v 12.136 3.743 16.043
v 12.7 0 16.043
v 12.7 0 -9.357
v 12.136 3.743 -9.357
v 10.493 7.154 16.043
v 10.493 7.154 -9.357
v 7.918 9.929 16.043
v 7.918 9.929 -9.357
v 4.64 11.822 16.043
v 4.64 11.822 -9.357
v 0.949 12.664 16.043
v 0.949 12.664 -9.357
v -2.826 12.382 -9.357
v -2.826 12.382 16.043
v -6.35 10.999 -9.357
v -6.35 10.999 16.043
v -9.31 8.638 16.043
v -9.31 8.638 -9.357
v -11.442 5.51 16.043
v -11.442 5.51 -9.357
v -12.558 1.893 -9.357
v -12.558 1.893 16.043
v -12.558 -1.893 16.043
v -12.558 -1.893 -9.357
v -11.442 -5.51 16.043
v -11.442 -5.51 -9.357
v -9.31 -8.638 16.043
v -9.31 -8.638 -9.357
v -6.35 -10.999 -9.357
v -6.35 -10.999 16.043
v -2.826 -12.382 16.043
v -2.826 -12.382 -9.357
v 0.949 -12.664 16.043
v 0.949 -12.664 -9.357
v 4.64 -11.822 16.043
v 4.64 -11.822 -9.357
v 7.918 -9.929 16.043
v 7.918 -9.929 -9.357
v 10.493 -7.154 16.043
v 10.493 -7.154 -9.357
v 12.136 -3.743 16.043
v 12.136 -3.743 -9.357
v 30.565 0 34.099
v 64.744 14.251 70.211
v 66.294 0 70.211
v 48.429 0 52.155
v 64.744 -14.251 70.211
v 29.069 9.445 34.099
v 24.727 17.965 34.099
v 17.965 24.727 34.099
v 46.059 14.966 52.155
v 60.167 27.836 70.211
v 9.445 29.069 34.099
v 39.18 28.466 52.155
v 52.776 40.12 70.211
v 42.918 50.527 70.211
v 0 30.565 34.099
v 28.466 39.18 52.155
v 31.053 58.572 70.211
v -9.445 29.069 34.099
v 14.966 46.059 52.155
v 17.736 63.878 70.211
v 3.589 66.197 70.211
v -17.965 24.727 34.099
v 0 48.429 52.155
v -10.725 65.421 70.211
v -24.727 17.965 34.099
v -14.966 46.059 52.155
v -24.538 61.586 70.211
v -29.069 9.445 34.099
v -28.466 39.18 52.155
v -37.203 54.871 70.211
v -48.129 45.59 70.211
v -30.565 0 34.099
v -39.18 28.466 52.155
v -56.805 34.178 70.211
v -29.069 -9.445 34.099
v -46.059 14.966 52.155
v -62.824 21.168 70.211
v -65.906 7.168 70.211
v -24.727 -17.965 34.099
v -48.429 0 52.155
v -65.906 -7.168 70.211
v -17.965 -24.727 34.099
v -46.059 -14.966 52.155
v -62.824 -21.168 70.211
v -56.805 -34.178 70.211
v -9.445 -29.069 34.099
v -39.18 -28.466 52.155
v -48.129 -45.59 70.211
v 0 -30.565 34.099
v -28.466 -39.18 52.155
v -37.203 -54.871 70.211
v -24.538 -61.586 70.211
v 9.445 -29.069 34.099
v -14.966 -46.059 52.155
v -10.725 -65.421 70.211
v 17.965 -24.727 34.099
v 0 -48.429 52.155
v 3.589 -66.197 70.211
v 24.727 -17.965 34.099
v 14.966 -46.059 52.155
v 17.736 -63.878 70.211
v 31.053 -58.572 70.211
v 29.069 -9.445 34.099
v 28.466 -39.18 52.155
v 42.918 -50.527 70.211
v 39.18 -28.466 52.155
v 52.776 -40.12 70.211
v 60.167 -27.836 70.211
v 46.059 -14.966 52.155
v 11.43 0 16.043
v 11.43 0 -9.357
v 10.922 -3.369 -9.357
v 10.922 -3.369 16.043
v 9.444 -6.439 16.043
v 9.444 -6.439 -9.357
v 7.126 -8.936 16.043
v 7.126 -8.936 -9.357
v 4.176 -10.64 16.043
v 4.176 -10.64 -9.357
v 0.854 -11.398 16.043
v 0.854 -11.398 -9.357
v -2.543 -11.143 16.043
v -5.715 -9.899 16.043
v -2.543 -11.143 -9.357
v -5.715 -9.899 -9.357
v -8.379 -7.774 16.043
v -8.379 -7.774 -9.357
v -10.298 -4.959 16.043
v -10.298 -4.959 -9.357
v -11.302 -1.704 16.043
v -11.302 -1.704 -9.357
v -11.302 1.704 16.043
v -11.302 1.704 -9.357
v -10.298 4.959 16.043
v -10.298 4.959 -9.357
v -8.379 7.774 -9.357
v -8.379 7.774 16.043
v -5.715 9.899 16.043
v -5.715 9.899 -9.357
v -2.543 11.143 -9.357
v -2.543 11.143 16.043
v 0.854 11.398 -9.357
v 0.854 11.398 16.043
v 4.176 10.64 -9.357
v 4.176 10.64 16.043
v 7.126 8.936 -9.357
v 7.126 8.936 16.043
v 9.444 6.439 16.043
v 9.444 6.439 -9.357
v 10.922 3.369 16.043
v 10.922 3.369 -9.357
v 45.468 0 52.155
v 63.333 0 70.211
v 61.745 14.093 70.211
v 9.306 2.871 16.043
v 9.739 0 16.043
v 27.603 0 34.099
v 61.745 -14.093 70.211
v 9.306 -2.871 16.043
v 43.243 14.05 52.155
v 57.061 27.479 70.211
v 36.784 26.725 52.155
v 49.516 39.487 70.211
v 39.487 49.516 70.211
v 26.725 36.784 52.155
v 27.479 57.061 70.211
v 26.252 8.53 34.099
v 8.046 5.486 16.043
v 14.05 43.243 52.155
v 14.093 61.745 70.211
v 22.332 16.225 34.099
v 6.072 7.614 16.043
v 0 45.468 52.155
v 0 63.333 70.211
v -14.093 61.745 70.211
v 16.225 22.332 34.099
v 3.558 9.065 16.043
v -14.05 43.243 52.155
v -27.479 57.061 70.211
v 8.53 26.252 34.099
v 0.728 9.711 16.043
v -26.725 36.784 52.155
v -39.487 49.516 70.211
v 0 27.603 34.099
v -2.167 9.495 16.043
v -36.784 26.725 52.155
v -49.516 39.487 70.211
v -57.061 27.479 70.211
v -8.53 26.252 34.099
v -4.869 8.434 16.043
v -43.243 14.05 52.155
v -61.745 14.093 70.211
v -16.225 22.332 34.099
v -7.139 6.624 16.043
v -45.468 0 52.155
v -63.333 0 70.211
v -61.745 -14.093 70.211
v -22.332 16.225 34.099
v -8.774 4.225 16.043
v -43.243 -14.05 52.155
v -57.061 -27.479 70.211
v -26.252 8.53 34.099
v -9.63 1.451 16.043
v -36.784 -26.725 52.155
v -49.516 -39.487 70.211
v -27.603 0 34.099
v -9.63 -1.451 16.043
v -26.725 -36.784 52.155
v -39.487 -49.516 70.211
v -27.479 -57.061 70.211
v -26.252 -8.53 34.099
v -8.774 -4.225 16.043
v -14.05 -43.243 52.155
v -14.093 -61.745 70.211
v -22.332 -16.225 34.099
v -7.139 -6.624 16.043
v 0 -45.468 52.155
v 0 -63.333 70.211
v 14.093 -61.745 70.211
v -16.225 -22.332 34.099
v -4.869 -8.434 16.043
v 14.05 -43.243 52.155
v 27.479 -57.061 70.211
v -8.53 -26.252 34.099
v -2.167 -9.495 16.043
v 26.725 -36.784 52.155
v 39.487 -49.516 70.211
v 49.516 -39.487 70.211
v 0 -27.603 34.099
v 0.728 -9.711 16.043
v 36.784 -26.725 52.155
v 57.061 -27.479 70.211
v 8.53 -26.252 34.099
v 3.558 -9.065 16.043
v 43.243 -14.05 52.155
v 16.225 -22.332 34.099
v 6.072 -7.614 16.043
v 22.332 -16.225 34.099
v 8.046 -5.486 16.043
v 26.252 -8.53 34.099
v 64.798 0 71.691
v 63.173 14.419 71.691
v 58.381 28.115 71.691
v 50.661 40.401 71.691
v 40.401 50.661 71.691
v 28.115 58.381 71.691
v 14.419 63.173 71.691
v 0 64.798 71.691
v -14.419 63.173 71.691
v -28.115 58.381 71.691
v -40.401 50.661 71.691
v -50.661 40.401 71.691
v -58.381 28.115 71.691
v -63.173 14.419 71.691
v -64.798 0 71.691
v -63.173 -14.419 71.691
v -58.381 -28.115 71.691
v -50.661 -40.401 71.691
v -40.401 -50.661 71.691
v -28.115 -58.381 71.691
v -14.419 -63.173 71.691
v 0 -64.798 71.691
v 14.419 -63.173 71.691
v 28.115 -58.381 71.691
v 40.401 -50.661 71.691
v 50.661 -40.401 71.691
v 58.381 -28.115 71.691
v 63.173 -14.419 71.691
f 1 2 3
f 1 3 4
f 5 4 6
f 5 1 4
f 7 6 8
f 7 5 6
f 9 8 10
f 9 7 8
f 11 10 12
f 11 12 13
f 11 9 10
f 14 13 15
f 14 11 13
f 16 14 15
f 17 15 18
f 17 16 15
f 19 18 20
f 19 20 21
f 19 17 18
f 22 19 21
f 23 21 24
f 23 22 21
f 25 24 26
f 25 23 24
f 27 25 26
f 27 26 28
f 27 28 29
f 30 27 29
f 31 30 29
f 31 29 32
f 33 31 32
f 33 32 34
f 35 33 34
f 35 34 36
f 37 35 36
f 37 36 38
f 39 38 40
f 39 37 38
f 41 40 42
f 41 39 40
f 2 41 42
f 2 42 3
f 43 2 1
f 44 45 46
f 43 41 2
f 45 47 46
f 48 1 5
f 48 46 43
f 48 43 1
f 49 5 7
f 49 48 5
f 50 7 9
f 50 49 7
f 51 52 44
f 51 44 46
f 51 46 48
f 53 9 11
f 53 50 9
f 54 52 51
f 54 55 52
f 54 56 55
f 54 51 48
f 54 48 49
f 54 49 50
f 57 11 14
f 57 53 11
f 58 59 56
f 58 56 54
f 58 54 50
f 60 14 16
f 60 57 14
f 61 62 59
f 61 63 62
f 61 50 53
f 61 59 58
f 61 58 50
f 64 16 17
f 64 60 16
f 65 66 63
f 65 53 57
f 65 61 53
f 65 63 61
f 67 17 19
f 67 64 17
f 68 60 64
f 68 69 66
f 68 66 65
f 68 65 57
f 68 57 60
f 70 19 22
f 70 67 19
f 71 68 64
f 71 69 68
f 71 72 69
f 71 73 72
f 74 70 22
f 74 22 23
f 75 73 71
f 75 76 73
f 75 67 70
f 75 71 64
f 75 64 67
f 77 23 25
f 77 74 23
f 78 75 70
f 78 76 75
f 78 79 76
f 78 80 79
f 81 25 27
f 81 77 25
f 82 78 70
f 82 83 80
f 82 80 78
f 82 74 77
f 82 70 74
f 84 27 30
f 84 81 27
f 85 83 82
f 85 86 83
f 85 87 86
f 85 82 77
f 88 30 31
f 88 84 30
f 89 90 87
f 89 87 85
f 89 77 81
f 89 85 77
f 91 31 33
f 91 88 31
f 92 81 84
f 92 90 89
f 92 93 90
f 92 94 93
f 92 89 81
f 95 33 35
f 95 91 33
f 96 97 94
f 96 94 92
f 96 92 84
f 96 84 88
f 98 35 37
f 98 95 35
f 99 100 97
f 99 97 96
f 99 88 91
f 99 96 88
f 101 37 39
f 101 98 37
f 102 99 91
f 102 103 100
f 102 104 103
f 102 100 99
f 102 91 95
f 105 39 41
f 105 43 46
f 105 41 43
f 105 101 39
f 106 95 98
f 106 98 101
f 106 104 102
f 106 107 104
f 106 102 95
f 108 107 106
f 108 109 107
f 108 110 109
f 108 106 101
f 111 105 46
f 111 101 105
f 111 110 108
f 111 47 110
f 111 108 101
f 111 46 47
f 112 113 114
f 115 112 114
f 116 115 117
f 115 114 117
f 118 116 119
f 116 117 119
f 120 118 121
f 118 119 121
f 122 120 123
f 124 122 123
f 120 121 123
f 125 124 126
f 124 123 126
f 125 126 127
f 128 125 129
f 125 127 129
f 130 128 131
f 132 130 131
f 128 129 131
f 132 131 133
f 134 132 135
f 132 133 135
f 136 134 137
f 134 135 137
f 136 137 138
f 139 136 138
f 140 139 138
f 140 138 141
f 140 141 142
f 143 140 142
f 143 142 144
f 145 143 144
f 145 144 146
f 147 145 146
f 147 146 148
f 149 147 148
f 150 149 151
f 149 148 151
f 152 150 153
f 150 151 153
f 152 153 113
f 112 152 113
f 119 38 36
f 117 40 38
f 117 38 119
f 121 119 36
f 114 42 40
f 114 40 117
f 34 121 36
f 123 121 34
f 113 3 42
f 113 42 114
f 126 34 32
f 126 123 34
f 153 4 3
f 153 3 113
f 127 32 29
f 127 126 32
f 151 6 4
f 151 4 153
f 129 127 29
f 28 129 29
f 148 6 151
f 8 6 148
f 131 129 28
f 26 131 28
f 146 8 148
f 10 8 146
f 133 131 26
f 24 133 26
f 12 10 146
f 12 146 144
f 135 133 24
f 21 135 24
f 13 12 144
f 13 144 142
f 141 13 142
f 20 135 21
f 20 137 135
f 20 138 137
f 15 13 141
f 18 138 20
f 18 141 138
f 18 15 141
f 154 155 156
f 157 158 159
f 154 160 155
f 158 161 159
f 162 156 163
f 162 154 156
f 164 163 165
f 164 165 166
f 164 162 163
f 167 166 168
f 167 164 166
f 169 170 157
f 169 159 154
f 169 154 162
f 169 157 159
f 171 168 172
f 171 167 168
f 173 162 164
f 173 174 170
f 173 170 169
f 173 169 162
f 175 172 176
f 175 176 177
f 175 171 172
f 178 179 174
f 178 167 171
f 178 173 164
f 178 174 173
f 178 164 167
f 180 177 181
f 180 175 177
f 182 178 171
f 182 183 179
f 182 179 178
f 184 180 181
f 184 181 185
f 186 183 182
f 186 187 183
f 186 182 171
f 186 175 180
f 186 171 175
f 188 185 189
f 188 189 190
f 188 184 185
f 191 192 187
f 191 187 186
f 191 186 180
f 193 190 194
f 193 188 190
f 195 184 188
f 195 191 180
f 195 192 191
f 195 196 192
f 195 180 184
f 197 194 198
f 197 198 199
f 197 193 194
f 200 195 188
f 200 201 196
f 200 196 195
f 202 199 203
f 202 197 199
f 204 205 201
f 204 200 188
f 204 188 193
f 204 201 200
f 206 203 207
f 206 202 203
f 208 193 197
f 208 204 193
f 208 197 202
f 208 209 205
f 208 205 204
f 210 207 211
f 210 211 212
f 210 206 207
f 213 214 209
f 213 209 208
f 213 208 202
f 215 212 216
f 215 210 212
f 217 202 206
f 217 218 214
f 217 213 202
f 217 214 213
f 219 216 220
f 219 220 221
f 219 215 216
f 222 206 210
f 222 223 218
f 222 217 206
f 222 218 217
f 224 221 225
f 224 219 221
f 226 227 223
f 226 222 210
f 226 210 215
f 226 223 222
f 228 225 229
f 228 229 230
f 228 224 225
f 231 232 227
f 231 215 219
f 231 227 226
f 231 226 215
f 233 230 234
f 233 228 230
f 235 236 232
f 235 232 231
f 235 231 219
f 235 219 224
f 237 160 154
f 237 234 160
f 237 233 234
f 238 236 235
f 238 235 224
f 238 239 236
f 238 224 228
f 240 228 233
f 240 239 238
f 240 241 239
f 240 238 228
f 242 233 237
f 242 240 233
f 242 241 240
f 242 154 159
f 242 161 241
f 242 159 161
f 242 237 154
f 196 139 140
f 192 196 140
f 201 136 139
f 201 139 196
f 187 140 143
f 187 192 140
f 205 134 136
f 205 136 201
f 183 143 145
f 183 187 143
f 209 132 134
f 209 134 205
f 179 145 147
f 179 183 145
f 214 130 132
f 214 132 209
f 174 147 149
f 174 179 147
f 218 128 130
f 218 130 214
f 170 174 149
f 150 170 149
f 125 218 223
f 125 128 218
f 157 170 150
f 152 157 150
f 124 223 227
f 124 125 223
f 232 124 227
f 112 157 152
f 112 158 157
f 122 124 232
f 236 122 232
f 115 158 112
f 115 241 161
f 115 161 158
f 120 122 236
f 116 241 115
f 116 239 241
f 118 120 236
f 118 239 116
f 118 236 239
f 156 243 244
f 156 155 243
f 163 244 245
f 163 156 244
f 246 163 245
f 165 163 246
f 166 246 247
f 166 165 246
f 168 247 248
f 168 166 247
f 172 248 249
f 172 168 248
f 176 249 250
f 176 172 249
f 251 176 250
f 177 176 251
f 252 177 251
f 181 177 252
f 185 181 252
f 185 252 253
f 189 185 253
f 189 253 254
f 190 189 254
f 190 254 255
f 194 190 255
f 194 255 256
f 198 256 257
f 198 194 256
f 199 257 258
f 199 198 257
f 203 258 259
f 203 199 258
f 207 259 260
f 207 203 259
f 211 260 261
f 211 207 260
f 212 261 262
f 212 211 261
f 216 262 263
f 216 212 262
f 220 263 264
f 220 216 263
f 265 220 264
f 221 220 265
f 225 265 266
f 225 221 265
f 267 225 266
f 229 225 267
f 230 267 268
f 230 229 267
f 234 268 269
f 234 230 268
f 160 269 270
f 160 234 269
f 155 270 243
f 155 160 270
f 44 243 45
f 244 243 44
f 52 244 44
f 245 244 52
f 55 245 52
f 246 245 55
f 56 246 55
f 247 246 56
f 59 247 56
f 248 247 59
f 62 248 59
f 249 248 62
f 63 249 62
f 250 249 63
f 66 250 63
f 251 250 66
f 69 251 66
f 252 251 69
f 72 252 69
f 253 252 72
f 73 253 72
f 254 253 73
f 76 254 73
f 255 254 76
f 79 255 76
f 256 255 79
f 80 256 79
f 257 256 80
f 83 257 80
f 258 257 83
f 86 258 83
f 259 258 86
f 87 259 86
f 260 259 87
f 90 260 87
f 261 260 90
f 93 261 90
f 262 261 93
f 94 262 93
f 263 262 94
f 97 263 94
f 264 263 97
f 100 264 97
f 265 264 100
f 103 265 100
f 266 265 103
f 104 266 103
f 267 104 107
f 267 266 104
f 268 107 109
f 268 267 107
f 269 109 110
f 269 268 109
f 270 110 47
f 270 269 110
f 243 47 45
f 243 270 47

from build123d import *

# Parameters (mm, degrees)
F1_FACE_R = 12.7
F2_DEPTH  = 25.4
F3_R      = 11.43
F4_DEPTH  = 25.4


with BuildPart() as f1:
    # F0 (on Front) → F1 (revolve)
    with BuildSketch(Plane.XZ):
        Polygon((0, -9.356778), (12.7, -9.356778), (12.7, 16.043222), (66.294158, 70.210613), (64.797749, 71.691186), (63.332844, 70.210613), (9.738686, 16.043222), (0, 16.043222), align=None)
    revolve(axis=Axis((0, 0, 3.343222), (0, 0, 1)))

    # F1_face (on face) → F2 (cut)
    with BuildSketch(Plane(origin=(0, 0, -9.356778), x_dir=(1, 0, 0), z_dir=(0, 0, -1))):
        Circle(F1_FACE_R)
    extrude(amount=F2_DEPTH, mode=Mode.SUBTRACT)

    # F3 (on face) → F4 (cut)
    with BuildSketch(Plane(origin=(0, 0, -9.356778), x_dir=(1, 0, 0), z_dir=(0, 0, -1))):
        Circle(F3_R)
    extrude(amount=-F4_DEPTH, mode=Mode.SUBTRACT)


solid = f1.part
